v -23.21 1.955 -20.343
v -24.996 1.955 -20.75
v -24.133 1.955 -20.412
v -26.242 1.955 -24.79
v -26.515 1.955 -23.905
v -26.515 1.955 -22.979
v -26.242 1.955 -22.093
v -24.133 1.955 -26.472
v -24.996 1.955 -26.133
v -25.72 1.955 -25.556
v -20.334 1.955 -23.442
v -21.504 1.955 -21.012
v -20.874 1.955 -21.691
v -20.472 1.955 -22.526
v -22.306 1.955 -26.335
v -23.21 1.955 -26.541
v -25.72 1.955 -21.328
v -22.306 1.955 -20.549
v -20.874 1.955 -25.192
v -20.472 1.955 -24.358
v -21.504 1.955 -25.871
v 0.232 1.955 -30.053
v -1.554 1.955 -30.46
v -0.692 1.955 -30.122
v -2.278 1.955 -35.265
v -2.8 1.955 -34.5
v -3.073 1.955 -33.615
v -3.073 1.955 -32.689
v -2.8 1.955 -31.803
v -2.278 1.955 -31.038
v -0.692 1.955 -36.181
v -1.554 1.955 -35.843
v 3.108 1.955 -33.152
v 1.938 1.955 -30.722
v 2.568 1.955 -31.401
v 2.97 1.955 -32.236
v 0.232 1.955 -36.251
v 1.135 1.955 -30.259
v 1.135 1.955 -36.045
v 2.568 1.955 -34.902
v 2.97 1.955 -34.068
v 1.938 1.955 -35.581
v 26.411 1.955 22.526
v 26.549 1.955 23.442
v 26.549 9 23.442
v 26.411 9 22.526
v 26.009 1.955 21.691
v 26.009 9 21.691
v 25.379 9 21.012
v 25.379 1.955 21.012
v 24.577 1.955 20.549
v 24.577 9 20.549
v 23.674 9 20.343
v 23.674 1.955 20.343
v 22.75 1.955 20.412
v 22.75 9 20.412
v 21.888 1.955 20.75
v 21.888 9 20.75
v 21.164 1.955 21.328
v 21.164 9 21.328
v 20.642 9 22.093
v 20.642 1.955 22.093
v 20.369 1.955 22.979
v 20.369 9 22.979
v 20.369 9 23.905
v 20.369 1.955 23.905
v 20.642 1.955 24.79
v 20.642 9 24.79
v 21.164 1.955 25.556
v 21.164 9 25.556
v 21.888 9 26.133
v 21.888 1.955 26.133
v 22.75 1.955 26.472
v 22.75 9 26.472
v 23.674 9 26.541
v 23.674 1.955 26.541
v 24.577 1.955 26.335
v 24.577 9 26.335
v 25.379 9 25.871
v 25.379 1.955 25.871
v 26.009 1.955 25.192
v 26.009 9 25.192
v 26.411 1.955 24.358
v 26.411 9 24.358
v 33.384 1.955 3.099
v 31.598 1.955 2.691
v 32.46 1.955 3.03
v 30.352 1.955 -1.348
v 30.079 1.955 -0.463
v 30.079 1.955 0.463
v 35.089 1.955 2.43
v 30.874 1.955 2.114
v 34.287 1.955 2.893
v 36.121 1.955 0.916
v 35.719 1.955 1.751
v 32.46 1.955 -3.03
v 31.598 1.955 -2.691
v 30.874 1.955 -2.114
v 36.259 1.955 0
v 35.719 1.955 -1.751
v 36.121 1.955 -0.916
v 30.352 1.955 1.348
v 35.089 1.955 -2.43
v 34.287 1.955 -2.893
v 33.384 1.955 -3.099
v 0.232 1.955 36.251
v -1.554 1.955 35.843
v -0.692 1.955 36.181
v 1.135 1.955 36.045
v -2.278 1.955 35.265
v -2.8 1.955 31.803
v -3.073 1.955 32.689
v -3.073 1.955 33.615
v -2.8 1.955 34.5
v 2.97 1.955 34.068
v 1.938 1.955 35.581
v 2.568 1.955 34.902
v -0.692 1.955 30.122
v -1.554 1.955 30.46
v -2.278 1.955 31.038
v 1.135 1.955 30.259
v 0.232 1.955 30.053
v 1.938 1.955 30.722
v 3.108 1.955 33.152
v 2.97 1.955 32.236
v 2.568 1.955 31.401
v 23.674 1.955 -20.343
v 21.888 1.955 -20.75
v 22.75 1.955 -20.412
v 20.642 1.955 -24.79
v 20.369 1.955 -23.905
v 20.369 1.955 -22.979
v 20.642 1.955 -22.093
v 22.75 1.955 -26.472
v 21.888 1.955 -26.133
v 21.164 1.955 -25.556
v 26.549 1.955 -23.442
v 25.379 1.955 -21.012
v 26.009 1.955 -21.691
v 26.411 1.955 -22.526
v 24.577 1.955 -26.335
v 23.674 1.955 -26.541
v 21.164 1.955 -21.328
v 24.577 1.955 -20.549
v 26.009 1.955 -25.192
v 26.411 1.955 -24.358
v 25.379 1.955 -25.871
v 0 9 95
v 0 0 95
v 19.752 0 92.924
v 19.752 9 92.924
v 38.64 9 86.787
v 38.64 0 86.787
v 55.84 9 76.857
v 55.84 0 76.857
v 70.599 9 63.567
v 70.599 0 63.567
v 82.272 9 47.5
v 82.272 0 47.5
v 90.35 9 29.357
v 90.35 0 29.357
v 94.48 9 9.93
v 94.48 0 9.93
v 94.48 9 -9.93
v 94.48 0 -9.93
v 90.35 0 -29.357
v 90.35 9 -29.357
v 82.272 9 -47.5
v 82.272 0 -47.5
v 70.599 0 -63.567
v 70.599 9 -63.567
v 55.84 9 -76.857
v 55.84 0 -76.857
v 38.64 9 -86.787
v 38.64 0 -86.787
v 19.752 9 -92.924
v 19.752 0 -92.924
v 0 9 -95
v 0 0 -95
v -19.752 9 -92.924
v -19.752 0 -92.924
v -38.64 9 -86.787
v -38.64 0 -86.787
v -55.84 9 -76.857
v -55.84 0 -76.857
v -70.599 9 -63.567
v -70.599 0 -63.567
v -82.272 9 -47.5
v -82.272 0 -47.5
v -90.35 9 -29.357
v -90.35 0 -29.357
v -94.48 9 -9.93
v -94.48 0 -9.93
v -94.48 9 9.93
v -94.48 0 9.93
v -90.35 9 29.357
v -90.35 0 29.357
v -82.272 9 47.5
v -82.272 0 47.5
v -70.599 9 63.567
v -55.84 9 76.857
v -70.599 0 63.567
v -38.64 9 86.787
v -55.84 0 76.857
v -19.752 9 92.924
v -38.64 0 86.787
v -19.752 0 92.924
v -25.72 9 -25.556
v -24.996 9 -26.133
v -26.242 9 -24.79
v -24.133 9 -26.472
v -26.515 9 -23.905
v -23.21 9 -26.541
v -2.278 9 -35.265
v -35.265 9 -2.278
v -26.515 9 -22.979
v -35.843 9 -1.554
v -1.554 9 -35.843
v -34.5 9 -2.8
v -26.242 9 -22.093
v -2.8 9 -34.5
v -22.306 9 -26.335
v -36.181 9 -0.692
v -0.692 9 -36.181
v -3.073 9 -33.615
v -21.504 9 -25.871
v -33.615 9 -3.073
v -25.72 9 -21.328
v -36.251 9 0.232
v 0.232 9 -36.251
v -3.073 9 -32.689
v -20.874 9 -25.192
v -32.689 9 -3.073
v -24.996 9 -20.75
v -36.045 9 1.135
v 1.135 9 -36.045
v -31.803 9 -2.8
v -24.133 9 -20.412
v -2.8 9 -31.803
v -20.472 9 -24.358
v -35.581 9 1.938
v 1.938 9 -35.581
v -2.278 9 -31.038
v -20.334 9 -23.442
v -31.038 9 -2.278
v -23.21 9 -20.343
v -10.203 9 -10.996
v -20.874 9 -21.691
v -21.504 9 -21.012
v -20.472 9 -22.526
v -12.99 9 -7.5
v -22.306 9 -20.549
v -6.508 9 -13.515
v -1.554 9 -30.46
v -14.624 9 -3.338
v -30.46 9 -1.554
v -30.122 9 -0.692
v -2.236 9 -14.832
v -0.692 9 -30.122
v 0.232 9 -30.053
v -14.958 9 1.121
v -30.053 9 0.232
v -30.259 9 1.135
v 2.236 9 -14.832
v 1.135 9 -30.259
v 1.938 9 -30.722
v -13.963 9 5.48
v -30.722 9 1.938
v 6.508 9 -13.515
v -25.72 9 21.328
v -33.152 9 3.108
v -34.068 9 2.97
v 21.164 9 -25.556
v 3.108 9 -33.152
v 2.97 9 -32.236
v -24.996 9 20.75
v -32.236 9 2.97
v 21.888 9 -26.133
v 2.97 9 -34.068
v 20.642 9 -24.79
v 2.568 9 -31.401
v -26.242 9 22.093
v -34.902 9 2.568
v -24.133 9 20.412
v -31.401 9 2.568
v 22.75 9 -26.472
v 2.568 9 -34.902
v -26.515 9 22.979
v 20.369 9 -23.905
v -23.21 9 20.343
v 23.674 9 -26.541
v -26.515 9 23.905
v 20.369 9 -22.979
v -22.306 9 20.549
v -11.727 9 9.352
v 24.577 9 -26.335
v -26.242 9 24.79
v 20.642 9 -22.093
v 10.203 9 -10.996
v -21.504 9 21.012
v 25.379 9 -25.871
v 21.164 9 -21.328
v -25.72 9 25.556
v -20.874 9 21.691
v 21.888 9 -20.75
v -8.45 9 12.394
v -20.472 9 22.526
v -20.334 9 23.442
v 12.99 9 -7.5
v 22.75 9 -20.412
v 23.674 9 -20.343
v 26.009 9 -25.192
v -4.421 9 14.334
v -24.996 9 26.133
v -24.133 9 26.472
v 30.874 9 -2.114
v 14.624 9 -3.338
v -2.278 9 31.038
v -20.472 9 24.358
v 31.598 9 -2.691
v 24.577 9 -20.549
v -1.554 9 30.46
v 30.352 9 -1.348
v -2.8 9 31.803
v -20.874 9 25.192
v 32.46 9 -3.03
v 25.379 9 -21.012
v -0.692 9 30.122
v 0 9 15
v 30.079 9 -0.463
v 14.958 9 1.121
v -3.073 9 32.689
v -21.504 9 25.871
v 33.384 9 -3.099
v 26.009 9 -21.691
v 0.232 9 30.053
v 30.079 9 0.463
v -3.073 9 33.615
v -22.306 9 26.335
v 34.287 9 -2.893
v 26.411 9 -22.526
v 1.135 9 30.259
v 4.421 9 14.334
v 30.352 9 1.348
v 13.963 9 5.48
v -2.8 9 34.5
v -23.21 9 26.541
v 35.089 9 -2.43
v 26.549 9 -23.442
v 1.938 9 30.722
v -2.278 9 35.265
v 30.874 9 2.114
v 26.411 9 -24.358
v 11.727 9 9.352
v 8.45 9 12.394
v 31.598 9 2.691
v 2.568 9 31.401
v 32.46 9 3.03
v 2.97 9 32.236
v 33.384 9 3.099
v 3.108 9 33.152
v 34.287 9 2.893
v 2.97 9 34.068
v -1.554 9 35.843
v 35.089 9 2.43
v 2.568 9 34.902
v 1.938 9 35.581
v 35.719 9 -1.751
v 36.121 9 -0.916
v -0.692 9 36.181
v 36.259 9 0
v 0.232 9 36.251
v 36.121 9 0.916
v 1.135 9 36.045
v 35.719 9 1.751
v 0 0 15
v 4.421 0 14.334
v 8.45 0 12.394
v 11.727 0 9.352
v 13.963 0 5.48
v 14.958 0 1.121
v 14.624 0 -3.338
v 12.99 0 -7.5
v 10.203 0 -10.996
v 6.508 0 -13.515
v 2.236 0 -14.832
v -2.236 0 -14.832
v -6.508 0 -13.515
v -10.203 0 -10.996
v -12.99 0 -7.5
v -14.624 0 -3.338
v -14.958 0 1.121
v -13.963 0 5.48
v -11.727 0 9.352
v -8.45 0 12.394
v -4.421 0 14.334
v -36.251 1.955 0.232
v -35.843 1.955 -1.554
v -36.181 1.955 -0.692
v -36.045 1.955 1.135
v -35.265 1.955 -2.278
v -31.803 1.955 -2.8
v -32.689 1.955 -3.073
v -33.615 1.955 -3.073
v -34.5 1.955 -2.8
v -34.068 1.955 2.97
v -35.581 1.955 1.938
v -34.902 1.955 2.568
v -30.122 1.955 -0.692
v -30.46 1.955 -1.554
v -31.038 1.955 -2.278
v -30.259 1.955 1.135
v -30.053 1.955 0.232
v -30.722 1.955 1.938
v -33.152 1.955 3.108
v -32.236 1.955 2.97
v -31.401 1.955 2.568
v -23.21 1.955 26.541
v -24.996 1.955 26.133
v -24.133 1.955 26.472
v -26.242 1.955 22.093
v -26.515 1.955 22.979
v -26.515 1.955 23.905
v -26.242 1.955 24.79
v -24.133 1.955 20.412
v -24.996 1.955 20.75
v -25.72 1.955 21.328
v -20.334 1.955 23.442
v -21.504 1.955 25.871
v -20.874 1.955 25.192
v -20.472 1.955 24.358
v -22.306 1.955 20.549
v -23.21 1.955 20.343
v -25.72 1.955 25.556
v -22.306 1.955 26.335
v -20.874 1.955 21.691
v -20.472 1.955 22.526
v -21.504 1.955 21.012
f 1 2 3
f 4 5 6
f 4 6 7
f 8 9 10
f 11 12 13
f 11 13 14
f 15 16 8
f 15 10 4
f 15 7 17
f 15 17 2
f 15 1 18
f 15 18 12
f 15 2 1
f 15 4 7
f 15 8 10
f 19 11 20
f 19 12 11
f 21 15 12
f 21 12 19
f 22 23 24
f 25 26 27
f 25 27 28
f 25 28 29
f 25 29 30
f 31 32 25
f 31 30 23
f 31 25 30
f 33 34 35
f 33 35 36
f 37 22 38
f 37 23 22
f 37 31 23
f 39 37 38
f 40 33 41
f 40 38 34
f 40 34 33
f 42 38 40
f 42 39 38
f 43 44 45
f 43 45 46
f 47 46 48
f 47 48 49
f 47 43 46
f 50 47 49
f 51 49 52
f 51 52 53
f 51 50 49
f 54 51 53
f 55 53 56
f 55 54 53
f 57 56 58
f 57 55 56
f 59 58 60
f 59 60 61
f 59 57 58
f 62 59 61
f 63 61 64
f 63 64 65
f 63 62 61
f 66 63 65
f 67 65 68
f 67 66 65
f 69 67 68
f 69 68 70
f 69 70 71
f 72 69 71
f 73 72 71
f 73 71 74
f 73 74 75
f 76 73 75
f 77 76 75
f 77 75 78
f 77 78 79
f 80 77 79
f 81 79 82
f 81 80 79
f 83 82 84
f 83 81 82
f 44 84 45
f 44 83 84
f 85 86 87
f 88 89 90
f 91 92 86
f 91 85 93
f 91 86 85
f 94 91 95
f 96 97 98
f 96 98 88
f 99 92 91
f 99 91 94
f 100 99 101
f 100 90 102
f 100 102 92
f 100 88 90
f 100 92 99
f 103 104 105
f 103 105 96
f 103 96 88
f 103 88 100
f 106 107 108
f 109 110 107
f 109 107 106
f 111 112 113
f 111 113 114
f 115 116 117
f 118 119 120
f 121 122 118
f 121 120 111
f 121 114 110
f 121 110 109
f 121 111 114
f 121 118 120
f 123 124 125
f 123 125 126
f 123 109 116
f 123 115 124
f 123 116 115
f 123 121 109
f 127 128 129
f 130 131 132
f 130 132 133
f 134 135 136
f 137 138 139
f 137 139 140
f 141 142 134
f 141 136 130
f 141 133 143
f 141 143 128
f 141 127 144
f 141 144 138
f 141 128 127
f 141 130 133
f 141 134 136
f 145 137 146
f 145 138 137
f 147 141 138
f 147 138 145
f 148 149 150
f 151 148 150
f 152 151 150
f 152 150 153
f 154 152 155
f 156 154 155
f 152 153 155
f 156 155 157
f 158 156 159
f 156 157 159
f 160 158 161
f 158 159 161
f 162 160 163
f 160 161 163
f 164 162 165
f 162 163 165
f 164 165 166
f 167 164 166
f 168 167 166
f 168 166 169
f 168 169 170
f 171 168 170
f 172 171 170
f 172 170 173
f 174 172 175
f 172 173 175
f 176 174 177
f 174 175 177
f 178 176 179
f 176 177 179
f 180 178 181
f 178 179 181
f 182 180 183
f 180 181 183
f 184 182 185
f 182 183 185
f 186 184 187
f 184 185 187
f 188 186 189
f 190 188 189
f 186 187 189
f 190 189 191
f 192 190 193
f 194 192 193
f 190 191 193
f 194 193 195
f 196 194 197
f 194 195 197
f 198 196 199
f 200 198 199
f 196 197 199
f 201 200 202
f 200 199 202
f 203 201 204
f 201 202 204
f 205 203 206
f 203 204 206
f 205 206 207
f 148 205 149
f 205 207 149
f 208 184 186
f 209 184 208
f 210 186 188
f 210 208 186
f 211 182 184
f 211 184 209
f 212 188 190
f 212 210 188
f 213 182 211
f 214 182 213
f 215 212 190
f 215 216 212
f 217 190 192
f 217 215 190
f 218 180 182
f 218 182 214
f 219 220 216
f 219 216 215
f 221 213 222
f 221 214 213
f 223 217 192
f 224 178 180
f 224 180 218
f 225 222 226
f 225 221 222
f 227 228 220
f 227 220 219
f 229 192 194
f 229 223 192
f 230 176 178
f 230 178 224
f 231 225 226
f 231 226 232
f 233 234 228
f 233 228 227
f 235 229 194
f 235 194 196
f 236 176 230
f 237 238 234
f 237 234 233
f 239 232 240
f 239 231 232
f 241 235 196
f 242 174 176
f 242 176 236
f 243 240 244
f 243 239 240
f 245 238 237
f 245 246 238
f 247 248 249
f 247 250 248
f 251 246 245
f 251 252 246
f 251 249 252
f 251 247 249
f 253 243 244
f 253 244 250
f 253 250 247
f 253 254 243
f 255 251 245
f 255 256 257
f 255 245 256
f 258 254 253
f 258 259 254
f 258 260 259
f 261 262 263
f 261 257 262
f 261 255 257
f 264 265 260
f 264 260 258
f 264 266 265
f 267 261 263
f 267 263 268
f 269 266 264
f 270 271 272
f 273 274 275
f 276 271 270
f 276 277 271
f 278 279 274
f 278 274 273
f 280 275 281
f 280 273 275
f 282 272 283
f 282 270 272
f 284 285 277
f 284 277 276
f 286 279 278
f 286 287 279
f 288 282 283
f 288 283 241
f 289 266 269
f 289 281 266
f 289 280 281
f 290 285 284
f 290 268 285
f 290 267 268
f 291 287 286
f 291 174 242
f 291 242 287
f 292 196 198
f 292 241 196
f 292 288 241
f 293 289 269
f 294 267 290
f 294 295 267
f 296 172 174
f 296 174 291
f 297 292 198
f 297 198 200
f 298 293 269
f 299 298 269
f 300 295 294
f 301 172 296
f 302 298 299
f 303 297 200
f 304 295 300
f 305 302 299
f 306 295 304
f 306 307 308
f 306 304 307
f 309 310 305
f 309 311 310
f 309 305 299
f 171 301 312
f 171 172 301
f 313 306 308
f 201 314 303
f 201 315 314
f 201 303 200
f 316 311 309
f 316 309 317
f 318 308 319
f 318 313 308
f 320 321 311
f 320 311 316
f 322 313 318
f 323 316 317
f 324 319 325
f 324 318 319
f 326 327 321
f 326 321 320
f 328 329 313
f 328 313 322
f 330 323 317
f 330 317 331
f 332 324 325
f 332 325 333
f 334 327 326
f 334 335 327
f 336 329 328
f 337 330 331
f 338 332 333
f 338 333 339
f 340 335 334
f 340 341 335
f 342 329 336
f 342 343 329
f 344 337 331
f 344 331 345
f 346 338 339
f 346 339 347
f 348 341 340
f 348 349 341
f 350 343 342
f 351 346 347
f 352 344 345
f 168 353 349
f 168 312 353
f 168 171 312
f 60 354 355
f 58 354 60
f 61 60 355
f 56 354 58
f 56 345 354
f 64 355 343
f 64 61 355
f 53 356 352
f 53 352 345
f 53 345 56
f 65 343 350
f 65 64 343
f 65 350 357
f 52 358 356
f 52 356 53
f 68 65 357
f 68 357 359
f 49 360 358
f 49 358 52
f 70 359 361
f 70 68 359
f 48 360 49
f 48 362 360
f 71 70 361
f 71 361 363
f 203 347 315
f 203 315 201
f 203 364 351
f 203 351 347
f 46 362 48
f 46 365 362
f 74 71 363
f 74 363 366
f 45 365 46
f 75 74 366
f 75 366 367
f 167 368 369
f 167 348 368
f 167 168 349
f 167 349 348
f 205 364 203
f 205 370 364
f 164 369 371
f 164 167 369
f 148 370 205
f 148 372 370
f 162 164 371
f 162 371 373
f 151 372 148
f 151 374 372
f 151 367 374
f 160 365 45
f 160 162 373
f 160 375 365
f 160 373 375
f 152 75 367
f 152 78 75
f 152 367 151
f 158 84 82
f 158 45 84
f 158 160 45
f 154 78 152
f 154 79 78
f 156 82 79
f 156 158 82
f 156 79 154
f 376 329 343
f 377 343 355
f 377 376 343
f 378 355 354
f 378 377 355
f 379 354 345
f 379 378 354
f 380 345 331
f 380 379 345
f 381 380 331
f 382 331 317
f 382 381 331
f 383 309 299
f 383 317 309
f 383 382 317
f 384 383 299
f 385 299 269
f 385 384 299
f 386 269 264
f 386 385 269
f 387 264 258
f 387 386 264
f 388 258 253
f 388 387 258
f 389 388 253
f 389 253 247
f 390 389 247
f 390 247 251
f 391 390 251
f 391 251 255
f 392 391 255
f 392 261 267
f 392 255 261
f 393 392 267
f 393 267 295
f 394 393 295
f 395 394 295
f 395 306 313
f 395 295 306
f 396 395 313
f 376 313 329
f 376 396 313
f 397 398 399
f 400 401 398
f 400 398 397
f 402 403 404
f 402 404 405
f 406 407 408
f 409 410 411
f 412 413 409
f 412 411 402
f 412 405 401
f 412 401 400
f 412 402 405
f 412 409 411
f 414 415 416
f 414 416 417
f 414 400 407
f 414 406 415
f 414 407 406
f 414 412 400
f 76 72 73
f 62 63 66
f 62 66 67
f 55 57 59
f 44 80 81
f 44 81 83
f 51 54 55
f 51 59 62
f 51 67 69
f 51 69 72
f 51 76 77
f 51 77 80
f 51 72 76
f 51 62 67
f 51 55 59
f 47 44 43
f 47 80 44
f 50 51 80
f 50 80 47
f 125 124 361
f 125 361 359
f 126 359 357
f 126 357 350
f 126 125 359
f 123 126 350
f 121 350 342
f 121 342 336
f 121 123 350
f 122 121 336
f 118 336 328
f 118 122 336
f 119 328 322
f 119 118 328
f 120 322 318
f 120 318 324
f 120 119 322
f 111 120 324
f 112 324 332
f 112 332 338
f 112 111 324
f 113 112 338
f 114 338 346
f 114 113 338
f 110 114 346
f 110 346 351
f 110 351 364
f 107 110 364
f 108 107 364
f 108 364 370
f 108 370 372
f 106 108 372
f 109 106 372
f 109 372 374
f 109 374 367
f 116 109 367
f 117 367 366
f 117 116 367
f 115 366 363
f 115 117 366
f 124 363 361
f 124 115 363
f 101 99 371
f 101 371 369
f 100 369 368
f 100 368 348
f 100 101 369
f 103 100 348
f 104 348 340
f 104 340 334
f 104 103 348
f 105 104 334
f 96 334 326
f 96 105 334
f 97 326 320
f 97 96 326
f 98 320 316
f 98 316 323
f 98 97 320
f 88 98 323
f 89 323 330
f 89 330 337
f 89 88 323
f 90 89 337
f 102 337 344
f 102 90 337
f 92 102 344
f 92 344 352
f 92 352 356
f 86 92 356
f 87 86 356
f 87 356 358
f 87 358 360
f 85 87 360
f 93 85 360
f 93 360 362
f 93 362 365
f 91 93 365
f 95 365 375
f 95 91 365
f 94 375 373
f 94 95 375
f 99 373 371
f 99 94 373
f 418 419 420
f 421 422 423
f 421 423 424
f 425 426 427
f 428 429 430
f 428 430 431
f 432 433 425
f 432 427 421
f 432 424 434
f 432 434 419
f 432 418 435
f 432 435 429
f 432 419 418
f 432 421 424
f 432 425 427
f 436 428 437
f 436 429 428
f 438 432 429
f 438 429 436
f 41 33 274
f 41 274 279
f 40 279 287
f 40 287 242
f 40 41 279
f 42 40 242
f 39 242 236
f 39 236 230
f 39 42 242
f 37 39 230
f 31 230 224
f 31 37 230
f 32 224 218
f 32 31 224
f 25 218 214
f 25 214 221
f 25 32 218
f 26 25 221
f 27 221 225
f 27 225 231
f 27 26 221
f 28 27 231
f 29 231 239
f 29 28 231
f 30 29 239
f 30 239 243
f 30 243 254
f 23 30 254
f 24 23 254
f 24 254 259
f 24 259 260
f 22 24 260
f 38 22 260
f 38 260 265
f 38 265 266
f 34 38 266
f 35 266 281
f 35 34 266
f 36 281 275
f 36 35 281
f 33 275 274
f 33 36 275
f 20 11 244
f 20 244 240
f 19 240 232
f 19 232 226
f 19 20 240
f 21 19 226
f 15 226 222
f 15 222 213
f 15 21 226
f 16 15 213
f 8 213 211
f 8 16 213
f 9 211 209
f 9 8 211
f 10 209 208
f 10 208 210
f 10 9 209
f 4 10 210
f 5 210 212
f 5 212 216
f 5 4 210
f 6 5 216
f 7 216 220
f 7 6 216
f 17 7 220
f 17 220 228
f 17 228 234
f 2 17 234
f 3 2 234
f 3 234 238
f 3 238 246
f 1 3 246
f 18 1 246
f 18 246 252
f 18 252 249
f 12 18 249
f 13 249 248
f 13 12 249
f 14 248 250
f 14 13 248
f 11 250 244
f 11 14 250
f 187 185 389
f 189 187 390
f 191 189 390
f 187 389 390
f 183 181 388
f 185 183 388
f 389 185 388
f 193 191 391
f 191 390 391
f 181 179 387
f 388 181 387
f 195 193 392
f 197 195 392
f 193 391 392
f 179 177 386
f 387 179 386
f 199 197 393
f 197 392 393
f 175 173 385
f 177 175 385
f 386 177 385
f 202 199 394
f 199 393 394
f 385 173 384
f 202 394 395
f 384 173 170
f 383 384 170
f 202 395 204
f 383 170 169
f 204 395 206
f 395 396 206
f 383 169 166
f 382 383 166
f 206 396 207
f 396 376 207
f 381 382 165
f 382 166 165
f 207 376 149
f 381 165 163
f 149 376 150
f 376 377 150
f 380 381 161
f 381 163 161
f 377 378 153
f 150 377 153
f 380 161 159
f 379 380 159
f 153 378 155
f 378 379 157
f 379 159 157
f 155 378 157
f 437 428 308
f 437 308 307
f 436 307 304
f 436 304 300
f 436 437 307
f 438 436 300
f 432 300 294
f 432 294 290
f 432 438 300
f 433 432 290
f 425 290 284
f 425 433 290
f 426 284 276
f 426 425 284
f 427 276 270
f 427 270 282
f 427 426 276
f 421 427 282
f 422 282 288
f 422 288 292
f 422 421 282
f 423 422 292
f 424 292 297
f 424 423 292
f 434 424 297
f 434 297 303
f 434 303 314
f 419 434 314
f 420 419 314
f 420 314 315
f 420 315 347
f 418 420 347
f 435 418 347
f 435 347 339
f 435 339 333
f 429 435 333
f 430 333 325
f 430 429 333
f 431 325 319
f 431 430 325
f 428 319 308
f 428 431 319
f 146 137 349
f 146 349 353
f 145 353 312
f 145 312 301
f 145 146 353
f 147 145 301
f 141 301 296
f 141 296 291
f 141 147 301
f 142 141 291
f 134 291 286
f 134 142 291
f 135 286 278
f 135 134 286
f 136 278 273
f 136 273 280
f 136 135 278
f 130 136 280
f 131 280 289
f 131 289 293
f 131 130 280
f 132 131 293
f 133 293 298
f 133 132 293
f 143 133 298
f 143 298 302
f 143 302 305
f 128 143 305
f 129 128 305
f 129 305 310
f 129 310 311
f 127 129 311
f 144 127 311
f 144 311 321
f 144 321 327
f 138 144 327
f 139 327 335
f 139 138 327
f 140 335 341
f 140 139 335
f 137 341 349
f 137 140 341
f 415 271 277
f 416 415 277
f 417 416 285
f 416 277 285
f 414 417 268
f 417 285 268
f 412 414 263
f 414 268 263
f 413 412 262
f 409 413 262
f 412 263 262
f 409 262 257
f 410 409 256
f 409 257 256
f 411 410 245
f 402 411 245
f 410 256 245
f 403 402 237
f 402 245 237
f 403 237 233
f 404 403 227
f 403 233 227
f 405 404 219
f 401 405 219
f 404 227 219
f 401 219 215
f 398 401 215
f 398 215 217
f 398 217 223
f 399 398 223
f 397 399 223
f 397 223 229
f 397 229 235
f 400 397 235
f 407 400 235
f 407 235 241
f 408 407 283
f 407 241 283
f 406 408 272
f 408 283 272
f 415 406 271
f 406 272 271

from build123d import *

# Parameters (mm, degrees)
SKETCH1_R           = 95
BOSS_EXTRUDE1_DEPTH = 9
SKETCH2_R           = 15
CUT_EXTRUDE1_DEPTH  = 135.651401775
SKETCH3_R           = 3.107652879
CUT_EXTRUDE2_DEPTH  = 7.045423675
CIRPATTERN1_COUNT   = 8


with BuildPart() as part:
    # Sketch1 → Boss-Extrude1 (new body)
    with BuildSketch(Plane(origin=(0, 0, 0), x_dir=(1, 0, 0), z_dir=(0, 1, 0))):
        Circle(SKETCH1_R)
    extrude(amount=BOSS_EXTRUDE1_DEPTH)

    # Sketch2 → Cut-Extrude1 (cut, through all)
    with BuildSketch(Plane(origin=(0, 0, 0), x_dir=(1, 0, 0), z_dir=(0, 1, 0))):
        Circle(SKETCH2_R)
    extrude(amount=CUT_EXTRUDE1_DEPTH, mode=Mode.SUBTRACT)

    # Sketch3 → Cut-Extrude2 (cut)
    with BuildSketch(Plane(origin=(0, 9, 0), x_dir=(1, 0, 0), z_dir=(0, 1, 0))):
        with Locations((-33.15170901, 0)):
            Circle(SKETCH3_R)
    cut_extrude2 = extrude(amount=-CUT_EXTRUDE2_DEPTH, mode=Mode.SUBTRACT)

    # CirPattern1: Cut-Extrude2 ×8 about axis
    cirpattern1_axis = Axis((0, 0, 0), (0, 1, 0))
    for i in range(1, CIRPATTERN1_COUNT):
        add(cut_extrude2.rotate(cirpattern1_axis, i * 360 / CIRPATTERN1_COUNT), mode=Mode.SUBTRACT)


solid = part.part
